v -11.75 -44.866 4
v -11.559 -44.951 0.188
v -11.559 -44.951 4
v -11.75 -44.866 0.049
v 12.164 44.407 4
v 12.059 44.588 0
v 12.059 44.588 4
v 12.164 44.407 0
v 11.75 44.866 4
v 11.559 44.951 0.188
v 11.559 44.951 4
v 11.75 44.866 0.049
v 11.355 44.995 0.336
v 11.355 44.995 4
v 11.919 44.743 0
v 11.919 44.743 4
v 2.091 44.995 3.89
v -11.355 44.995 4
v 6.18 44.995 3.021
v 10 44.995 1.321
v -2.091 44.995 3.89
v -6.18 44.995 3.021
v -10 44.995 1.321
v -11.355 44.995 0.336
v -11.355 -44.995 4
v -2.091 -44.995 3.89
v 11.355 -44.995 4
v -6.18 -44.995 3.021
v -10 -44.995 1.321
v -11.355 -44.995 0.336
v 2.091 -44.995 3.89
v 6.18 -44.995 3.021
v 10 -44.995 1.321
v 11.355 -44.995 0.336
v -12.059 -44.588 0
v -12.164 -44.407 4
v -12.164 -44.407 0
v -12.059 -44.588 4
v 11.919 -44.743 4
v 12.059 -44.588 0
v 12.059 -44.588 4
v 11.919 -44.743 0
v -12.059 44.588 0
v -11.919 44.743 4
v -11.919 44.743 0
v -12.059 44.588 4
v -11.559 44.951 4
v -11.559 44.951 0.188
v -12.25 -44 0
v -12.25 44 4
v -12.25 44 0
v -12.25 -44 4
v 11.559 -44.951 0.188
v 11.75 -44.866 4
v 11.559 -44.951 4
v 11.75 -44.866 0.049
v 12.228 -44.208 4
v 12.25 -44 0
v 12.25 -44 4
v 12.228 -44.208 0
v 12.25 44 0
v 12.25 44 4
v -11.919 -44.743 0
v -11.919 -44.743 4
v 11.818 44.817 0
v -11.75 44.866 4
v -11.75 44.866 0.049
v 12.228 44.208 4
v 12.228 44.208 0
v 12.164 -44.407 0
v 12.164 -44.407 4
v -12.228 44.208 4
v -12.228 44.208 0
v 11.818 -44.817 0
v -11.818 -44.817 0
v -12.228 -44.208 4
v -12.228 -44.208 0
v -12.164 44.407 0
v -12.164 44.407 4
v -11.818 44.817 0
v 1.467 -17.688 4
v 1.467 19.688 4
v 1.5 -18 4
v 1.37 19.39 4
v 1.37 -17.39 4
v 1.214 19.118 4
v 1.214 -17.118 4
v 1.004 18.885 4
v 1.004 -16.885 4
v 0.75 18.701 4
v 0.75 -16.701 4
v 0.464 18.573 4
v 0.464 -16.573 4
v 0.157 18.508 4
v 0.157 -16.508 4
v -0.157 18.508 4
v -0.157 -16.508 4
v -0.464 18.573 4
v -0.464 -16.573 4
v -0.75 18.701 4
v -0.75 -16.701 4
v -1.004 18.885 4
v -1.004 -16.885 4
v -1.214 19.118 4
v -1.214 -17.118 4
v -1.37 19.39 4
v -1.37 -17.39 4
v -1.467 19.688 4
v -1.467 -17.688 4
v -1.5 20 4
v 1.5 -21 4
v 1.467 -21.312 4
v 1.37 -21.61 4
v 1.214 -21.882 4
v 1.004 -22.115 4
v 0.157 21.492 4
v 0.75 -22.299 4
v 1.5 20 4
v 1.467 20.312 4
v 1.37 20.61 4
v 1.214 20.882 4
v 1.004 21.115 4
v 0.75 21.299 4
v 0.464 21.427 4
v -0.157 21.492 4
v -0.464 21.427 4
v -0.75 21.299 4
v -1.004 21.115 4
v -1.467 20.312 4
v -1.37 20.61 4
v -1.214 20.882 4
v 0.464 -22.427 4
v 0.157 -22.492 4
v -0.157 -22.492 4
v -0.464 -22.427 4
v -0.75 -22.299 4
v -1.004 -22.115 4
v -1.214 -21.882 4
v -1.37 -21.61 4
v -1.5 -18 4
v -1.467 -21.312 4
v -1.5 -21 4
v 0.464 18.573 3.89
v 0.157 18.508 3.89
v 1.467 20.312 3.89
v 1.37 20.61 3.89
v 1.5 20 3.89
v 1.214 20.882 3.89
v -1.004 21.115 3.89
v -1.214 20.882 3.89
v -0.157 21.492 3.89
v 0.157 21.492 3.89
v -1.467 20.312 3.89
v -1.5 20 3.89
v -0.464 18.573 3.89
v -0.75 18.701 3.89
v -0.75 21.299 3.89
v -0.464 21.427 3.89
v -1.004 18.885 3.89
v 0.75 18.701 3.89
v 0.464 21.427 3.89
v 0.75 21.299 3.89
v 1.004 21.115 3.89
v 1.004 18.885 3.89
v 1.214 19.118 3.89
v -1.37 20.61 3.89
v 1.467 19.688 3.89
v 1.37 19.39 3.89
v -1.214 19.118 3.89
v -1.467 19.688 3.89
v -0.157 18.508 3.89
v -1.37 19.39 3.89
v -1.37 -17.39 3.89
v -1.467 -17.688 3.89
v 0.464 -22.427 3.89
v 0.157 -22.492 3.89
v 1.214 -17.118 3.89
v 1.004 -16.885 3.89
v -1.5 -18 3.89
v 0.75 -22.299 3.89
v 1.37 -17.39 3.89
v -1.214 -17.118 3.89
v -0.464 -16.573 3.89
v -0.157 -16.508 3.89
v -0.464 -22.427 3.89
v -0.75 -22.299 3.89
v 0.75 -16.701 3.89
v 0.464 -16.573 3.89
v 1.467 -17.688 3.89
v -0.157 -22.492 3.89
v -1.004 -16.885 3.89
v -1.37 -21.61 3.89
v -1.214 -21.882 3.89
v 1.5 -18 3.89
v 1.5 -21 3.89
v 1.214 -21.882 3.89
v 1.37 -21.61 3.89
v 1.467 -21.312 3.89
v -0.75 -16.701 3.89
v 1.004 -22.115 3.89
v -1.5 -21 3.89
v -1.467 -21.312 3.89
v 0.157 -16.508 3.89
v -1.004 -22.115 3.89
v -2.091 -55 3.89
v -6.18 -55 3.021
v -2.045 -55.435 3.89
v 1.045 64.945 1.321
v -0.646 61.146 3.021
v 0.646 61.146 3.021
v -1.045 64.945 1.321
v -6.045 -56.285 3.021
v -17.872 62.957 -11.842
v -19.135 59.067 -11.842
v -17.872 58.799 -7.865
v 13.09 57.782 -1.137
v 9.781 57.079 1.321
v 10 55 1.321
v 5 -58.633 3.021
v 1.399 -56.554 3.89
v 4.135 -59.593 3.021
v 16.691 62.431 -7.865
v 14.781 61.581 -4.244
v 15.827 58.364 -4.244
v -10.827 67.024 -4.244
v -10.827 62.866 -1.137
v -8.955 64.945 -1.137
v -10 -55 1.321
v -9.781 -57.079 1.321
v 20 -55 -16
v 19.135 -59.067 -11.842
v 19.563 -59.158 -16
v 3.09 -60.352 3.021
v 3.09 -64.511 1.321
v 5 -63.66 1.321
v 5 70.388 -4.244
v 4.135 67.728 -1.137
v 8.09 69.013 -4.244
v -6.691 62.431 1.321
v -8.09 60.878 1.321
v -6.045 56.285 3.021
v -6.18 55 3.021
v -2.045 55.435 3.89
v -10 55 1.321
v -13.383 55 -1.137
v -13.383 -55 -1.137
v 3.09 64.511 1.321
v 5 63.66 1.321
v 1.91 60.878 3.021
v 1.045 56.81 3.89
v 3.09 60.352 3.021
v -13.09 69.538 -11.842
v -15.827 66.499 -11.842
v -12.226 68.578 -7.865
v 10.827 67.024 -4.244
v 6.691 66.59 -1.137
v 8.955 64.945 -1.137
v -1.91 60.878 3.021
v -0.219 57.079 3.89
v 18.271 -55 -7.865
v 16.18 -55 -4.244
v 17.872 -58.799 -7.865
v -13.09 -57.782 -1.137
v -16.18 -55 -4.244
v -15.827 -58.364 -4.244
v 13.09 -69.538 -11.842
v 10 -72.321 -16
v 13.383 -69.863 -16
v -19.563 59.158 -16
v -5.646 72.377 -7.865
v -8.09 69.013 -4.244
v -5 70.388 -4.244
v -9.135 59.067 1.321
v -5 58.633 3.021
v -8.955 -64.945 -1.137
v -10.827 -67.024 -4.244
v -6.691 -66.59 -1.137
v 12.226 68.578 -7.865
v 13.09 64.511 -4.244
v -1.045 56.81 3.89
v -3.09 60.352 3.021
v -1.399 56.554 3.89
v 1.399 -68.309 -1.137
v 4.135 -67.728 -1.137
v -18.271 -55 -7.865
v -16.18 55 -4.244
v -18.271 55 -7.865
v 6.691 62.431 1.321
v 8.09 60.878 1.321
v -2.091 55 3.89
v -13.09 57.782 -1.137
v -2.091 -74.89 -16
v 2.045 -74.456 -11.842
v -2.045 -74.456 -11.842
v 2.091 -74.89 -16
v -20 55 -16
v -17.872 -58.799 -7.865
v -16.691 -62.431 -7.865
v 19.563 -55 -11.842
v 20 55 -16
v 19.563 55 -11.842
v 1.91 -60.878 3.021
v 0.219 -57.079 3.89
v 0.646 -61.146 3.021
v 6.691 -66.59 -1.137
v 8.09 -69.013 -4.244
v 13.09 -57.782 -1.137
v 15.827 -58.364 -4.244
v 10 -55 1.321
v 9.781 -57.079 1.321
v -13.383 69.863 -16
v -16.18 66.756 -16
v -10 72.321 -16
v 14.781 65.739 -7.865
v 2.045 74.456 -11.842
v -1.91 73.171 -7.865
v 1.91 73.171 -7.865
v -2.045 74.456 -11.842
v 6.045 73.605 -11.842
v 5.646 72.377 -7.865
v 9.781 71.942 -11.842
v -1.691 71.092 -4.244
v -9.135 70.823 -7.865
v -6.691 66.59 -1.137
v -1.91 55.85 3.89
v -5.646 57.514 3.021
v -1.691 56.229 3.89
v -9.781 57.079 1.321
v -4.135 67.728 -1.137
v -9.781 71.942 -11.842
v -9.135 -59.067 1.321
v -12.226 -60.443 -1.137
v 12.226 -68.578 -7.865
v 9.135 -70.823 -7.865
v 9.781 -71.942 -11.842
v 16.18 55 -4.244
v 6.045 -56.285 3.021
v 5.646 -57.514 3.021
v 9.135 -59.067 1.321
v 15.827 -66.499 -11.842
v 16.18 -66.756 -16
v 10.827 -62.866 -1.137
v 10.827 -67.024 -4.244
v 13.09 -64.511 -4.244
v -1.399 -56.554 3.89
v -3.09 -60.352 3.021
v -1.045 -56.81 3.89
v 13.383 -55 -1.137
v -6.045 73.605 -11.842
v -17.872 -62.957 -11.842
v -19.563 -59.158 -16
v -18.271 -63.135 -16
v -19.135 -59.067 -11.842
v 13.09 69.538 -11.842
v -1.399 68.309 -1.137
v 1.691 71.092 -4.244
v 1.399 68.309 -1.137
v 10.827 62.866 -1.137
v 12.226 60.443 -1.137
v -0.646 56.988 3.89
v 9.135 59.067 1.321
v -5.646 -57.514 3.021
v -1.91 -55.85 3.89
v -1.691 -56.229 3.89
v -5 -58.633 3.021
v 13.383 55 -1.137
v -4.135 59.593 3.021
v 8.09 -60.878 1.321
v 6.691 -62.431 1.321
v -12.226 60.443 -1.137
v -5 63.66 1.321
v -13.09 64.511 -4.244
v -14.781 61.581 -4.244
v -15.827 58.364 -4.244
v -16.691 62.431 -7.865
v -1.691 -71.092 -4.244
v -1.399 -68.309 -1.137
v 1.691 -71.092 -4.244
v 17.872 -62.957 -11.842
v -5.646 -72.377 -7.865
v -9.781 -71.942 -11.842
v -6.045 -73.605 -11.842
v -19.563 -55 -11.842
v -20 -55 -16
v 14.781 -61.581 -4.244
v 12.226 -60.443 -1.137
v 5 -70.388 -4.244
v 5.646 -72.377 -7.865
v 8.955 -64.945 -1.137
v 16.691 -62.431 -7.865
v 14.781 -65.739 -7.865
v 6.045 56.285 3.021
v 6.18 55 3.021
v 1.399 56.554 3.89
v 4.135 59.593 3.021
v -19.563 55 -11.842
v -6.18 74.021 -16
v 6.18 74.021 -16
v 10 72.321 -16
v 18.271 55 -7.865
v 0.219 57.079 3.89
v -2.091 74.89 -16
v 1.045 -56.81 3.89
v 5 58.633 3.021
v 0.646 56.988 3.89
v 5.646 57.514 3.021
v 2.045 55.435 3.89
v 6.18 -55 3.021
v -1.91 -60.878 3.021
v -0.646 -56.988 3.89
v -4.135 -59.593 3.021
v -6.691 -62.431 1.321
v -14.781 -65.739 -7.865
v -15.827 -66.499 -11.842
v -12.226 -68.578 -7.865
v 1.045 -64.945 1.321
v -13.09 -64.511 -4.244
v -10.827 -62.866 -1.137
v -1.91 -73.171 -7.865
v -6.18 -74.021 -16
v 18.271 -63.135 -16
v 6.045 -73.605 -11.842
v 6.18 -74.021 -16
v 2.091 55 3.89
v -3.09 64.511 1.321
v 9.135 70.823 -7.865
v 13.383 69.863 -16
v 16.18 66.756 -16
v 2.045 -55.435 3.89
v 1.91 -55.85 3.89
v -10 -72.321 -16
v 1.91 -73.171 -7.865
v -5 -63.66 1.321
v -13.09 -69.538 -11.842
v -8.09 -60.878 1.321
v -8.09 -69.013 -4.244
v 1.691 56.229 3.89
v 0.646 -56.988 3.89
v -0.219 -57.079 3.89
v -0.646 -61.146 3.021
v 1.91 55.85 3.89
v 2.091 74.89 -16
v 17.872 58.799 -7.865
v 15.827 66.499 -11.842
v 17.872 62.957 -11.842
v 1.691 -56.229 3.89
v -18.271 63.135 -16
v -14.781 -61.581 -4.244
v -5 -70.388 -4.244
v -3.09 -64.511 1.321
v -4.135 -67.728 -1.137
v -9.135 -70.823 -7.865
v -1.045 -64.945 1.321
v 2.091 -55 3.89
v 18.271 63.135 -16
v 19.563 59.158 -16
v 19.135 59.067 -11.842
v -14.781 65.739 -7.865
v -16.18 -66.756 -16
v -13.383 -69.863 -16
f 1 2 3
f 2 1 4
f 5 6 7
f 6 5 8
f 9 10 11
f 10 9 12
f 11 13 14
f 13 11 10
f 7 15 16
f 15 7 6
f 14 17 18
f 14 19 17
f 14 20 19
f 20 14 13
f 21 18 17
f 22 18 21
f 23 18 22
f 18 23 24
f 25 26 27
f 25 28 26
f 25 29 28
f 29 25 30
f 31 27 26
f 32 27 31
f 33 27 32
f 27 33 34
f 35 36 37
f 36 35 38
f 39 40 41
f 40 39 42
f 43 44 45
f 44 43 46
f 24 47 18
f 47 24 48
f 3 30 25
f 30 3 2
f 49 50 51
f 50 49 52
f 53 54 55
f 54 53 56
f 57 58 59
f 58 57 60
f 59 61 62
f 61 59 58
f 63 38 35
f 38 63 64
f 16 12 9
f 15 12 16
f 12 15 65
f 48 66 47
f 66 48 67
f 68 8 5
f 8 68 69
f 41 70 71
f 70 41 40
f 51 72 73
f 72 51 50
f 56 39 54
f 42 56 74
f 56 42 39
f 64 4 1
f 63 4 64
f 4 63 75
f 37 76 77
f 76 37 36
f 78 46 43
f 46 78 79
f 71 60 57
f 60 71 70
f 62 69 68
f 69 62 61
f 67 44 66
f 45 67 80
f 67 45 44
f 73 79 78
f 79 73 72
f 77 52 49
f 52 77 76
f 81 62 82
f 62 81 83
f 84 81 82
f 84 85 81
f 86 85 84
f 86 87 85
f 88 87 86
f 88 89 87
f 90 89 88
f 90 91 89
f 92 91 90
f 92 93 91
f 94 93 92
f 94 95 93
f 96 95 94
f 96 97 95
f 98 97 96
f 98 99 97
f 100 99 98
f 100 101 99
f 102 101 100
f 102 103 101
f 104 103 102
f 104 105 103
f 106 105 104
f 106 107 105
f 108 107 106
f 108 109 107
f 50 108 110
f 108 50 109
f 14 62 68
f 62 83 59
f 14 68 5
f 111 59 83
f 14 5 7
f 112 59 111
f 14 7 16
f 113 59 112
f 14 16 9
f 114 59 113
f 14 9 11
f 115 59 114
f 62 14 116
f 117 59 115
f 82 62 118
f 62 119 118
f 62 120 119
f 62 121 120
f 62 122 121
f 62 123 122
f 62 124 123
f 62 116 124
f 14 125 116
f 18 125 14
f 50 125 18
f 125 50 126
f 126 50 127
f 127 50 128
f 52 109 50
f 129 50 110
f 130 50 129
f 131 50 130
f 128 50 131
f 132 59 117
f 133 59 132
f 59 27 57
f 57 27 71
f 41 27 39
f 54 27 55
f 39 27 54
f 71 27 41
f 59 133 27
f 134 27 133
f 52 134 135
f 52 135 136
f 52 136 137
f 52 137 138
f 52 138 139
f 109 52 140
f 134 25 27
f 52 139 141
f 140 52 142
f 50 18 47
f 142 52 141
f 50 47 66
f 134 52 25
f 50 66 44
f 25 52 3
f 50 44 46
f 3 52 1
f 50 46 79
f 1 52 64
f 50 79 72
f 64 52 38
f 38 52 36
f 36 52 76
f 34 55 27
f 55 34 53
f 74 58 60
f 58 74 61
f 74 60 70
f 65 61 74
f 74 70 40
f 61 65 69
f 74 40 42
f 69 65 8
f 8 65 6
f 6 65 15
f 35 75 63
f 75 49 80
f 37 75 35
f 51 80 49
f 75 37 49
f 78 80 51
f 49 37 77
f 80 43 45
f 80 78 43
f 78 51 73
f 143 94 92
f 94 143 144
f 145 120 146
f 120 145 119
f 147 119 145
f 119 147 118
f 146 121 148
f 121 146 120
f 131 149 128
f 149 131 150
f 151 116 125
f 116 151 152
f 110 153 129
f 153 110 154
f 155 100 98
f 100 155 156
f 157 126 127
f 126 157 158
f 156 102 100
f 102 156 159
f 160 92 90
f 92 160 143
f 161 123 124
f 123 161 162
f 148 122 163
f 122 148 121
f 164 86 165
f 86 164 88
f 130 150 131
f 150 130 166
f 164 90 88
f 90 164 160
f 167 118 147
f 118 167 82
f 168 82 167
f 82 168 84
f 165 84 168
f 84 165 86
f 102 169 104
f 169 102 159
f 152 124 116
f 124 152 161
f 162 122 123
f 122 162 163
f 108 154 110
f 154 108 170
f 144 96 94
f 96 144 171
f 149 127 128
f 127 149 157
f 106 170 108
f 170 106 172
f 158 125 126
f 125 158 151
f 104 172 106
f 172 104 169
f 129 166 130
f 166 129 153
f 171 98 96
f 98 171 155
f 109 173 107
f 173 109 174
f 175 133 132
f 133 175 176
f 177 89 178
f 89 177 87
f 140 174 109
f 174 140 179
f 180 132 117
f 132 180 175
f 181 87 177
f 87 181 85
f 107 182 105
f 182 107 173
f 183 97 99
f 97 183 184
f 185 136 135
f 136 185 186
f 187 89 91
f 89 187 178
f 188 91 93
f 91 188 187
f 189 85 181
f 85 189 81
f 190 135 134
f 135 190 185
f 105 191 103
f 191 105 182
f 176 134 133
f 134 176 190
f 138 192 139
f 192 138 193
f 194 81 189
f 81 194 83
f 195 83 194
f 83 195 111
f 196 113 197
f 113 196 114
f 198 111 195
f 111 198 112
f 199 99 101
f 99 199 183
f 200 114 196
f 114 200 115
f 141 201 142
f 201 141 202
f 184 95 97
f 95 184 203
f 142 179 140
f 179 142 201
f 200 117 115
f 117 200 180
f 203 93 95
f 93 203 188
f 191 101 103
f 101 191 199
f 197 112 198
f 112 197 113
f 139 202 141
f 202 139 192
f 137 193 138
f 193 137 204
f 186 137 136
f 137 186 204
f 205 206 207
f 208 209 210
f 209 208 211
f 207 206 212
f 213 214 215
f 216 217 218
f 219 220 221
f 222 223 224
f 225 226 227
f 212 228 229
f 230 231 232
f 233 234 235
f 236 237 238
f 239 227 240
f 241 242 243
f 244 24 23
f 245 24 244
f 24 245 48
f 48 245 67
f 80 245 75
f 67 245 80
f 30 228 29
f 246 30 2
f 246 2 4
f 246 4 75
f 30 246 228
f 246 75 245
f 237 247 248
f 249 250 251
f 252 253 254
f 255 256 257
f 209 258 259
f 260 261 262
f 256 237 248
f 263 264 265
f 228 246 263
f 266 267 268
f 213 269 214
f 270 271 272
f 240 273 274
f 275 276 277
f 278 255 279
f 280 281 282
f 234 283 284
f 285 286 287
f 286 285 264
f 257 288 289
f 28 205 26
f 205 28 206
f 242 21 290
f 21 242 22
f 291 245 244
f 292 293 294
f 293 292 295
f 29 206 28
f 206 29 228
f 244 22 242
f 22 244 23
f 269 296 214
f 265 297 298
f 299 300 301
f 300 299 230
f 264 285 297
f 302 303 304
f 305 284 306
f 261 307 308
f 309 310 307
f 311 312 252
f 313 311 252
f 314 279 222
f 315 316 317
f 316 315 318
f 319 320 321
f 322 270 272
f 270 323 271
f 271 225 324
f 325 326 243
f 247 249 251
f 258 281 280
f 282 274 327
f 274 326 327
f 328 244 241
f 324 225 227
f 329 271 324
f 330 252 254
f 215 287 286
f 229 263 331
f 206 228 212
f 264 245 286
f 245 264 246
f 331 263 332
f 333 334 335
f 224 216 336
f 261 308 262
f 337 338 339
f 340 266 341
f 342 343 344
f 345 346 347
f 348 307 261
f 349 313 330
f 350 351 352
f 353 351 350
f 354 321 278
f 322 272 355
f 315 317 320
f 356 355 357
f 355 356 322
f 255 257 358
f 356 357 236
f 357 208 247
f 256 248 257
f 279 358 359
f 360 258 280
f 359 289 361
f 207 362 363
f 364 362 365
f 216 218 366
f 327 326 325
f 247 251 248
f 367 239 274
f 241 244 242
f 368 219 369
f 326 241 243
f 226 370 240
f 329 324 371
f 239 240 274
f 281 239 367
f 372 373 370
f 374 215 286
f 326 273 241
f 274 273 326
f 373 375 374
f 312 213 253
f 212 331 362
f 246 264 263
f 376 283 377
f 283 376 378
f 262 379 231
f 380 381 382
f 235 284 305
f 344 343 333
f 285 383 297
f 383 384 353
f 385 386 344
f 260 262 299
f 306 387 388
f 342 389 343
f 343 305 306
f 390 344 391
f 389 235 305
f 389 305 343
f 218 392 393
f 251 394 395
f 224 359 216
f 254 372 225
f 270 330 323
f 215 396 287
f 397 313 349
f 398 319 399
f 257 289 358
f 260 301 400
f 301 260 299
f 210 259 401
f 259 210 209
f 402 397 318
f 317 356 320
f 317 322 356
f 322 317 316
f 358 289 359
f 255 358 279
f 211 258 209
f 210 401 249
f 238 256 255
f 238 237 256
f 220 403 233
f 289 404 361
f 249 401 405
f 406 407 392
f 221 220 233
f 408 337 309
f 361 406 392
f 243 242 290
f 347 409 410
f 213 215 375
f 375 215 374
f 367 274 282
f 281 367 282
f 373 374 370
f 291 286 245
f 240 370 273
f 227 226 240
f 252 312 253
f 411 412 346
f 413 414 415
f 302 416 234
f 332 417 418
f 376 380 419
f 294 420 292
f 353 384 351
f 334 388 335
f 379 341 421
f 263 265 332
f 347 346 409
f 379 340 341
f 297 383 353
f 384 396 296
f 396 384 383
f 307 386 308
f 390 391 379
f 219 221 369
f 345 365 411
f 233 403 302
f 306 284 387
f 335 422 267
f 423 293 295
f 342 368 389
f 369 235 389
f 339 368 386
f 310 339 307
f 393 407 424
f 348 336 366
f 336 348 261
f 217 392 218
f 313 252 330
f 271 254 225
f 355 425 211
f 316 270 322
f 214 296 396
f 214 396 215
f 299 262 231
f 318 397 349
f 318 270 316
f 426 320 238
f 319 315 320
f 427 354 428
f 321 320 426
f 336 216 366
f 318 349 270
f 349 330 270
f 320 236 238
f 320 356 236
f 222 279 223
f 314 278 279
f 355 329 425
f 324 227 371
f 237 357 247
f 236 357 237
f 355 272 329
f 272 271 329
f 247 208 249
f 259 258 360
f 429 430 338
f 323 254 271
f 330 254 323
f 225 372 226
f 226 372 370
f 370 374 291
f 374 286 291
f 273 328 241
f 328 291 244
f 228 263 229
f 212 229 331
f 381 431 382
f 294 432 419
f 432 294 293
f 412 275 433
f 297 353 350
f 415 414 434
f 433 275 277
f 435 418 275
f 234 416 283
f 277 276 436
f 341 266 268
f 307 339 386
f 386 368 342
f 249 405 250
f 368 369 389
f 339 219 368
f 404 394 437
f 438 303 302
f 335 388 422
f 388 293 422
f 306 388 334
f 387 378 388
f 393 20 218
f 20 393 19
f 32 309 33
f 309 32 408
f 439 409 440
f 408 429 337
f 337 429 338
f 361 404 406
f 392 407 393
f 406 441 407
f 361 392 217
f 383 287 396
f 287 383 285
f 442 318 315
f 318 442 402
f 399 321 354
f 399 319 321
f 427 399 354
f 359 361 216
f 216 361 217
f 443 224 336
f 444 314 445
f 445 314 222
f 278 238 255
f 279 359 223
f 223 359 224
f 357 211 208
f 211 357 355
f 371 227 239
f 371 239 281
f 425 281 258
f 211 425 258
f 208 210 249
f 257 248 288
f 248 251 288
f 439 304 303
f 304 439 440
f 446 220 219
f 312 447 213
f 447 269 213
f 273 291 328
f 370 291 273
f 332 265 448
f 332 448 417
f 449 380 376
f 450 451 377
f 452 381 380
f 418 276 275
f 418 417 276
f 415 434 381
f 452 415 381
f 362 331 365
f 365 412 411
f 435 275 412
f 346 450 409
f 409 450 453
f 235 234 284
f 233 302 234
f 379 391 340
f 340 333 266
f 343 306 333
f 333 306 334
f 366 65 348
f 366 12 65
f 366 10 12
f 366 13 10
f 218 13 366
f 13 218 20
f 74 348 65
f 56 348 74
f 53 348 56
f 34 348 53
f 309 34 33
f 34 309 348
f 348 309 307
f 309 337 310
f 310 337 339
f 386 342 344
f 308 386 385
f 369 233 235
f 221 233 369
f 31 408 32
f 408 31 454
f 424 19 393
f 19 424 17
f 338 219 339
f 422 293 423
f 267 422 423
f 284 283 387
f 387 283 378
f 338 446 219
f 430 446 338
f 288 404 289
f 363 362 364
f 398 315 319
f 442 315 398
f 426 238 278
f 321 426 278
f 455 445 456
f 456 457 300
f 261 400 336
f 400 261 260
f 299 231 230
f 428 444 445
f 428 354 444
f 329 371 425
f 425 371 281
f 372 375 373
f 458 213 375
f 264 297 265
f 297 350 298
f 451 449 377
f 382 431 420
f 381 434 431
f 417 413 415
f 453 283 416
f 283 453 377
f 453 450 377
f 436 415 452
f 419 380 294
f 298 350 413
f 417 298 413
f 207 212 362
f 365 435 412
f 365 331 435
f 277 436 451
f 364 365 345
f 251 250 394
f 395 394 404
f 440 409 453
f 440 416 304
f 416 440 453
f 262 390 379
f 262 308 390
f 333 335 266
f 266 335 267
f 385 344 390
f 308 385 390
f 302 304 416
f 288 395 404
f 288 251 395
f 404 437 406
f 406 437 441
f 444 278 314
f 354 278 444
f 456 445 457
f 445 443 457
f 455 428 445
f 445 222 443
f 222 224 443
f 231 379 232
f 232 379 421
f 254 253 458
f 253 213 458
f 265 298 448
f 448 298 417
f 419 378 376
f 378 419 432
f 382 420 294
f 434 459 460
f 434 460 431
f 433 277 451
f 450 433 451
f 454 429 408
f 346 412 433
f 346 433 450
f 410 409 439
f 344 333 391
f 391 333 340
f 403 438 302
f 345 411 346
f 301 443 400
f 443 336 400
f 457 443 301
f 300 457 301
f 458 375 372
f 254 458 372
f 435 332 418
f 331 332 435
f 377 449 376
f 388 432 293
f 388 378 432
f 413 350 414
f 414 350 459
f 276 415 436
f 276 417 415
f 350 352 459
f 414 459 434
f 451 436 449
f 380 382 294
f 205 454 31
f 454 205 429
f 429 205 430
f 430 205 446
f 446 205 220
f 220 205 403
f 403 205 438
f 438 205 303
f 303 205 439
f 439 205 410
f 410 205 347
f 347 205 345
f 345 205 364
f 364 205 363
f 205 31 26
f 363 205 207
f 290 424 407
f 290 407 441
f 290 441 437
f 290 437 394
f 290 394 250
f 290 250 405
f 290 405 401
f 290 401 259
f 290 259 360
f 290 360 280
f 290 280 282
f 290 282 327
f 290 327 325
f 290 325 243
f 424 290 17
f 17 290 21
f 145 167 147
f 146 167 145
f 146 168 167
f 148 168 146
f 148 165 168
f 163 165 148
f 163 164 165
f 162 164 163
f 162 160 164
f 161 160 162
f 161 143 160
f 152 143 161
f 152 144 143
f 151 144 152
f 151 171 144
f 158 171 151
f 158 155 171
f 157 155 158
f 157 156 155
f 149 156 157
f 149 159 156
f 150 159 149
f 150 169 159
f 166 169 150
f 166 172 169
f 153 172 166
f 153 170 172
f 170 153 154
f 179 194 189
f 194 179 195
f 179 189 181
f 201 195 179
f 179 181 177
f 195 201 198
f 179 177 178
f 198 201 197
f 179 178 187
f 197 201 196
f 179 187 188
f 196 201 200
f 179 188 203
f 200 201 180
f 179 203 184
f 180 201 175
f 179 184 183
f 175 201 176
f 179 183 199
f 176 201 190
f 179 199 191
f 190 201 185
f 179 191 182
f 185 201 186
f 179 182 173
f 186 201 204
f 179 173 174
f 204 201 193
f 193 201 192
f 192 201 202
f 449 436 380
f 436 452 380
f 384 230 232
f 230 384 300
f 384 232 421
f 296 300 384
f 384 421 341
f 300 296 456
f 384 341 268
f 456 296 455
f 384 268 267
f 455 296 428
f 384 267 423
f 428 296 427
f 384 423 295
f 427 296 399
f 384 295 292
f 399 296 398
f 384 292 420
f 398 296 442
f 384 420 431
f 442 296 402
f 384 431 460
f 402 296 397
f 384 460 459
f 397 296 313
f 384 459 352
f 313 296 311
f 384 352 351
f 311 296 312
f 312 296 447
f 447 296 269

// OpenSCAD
$fn=30;

flatTopWidth = 24.5;
flatTopHeight = 90;
flatTopThickness = 4;

footHeight = 150;
footWidth = 40;
footThickness = 20;

module flatTop () {
    roundRadius = 1;

    module edge () {
        hull()  {
            cylinder(h=flatTopThickness, r=roundRadius);
            translate(v = [flatTopWidth - 2 * roundRadius,0,0]) 
            cylinder(h=flatTopThickness, r=roundRadius);
        }
    }

    module surface () {
        color(c="#ffff66")
        translate(v = [roundRadius, -roundRadius, 0])  {
            hull () {
                edge();
                translate(v = [0, -flatTopHeight + 2 * roundRadius, 0]) 
                edge();
            }
        }
    }

    module hole1 () {
        hole1Radius = 1.5;

        translate(v = [flatTopWidth/2,-23.5-hole1Radius,-.2]) 
        color(c="#ff3333")
        cylinder(h = flatTopThickness+0.4, r = 1.5);
    }

    module hole2 () {
        hole2Radius = 1.5;
        color(c="#ff3333")

        translate(v = [flatTopWidth/2,-23.5-hole2Radius-38,-.2]) 
        hull() {
            cylinder(h = flatTopThickness+0.4, r = 1.5);
            translate(v = [0,-3,0]) 
            cylinder(h = flatTopThickness+0.4, r = 1.5);
        }
        
    }


    translate(v = [-flatTopWidth/2,flatTopHeight/2,0]) 
    difference() {
        surface();
        hole1();
        hole2();
    }
}

module foot () {
    translate(v = [0,0,flatTopThickness]) 
    difference() {
        hull () {
            translate(v = [0,footHeight/2 - footWidth/2,-footWidth/2]) 
            sphere(r = footWidth/2);
            translate(v = [0,-footHeight/2 + footWidth/2,-footWidth/2]) 
            sphere(r = footWidth/2);
        }
        translate(v = [-footWidth/2,-footHeight/2,-2*footThickness]) 
        cube([footWidth, footHeight, footThickness]);
    }
}


module stand () {
    flatTop();
    // translate(v = [0,0,4]) 
    foot();
}


stand();
